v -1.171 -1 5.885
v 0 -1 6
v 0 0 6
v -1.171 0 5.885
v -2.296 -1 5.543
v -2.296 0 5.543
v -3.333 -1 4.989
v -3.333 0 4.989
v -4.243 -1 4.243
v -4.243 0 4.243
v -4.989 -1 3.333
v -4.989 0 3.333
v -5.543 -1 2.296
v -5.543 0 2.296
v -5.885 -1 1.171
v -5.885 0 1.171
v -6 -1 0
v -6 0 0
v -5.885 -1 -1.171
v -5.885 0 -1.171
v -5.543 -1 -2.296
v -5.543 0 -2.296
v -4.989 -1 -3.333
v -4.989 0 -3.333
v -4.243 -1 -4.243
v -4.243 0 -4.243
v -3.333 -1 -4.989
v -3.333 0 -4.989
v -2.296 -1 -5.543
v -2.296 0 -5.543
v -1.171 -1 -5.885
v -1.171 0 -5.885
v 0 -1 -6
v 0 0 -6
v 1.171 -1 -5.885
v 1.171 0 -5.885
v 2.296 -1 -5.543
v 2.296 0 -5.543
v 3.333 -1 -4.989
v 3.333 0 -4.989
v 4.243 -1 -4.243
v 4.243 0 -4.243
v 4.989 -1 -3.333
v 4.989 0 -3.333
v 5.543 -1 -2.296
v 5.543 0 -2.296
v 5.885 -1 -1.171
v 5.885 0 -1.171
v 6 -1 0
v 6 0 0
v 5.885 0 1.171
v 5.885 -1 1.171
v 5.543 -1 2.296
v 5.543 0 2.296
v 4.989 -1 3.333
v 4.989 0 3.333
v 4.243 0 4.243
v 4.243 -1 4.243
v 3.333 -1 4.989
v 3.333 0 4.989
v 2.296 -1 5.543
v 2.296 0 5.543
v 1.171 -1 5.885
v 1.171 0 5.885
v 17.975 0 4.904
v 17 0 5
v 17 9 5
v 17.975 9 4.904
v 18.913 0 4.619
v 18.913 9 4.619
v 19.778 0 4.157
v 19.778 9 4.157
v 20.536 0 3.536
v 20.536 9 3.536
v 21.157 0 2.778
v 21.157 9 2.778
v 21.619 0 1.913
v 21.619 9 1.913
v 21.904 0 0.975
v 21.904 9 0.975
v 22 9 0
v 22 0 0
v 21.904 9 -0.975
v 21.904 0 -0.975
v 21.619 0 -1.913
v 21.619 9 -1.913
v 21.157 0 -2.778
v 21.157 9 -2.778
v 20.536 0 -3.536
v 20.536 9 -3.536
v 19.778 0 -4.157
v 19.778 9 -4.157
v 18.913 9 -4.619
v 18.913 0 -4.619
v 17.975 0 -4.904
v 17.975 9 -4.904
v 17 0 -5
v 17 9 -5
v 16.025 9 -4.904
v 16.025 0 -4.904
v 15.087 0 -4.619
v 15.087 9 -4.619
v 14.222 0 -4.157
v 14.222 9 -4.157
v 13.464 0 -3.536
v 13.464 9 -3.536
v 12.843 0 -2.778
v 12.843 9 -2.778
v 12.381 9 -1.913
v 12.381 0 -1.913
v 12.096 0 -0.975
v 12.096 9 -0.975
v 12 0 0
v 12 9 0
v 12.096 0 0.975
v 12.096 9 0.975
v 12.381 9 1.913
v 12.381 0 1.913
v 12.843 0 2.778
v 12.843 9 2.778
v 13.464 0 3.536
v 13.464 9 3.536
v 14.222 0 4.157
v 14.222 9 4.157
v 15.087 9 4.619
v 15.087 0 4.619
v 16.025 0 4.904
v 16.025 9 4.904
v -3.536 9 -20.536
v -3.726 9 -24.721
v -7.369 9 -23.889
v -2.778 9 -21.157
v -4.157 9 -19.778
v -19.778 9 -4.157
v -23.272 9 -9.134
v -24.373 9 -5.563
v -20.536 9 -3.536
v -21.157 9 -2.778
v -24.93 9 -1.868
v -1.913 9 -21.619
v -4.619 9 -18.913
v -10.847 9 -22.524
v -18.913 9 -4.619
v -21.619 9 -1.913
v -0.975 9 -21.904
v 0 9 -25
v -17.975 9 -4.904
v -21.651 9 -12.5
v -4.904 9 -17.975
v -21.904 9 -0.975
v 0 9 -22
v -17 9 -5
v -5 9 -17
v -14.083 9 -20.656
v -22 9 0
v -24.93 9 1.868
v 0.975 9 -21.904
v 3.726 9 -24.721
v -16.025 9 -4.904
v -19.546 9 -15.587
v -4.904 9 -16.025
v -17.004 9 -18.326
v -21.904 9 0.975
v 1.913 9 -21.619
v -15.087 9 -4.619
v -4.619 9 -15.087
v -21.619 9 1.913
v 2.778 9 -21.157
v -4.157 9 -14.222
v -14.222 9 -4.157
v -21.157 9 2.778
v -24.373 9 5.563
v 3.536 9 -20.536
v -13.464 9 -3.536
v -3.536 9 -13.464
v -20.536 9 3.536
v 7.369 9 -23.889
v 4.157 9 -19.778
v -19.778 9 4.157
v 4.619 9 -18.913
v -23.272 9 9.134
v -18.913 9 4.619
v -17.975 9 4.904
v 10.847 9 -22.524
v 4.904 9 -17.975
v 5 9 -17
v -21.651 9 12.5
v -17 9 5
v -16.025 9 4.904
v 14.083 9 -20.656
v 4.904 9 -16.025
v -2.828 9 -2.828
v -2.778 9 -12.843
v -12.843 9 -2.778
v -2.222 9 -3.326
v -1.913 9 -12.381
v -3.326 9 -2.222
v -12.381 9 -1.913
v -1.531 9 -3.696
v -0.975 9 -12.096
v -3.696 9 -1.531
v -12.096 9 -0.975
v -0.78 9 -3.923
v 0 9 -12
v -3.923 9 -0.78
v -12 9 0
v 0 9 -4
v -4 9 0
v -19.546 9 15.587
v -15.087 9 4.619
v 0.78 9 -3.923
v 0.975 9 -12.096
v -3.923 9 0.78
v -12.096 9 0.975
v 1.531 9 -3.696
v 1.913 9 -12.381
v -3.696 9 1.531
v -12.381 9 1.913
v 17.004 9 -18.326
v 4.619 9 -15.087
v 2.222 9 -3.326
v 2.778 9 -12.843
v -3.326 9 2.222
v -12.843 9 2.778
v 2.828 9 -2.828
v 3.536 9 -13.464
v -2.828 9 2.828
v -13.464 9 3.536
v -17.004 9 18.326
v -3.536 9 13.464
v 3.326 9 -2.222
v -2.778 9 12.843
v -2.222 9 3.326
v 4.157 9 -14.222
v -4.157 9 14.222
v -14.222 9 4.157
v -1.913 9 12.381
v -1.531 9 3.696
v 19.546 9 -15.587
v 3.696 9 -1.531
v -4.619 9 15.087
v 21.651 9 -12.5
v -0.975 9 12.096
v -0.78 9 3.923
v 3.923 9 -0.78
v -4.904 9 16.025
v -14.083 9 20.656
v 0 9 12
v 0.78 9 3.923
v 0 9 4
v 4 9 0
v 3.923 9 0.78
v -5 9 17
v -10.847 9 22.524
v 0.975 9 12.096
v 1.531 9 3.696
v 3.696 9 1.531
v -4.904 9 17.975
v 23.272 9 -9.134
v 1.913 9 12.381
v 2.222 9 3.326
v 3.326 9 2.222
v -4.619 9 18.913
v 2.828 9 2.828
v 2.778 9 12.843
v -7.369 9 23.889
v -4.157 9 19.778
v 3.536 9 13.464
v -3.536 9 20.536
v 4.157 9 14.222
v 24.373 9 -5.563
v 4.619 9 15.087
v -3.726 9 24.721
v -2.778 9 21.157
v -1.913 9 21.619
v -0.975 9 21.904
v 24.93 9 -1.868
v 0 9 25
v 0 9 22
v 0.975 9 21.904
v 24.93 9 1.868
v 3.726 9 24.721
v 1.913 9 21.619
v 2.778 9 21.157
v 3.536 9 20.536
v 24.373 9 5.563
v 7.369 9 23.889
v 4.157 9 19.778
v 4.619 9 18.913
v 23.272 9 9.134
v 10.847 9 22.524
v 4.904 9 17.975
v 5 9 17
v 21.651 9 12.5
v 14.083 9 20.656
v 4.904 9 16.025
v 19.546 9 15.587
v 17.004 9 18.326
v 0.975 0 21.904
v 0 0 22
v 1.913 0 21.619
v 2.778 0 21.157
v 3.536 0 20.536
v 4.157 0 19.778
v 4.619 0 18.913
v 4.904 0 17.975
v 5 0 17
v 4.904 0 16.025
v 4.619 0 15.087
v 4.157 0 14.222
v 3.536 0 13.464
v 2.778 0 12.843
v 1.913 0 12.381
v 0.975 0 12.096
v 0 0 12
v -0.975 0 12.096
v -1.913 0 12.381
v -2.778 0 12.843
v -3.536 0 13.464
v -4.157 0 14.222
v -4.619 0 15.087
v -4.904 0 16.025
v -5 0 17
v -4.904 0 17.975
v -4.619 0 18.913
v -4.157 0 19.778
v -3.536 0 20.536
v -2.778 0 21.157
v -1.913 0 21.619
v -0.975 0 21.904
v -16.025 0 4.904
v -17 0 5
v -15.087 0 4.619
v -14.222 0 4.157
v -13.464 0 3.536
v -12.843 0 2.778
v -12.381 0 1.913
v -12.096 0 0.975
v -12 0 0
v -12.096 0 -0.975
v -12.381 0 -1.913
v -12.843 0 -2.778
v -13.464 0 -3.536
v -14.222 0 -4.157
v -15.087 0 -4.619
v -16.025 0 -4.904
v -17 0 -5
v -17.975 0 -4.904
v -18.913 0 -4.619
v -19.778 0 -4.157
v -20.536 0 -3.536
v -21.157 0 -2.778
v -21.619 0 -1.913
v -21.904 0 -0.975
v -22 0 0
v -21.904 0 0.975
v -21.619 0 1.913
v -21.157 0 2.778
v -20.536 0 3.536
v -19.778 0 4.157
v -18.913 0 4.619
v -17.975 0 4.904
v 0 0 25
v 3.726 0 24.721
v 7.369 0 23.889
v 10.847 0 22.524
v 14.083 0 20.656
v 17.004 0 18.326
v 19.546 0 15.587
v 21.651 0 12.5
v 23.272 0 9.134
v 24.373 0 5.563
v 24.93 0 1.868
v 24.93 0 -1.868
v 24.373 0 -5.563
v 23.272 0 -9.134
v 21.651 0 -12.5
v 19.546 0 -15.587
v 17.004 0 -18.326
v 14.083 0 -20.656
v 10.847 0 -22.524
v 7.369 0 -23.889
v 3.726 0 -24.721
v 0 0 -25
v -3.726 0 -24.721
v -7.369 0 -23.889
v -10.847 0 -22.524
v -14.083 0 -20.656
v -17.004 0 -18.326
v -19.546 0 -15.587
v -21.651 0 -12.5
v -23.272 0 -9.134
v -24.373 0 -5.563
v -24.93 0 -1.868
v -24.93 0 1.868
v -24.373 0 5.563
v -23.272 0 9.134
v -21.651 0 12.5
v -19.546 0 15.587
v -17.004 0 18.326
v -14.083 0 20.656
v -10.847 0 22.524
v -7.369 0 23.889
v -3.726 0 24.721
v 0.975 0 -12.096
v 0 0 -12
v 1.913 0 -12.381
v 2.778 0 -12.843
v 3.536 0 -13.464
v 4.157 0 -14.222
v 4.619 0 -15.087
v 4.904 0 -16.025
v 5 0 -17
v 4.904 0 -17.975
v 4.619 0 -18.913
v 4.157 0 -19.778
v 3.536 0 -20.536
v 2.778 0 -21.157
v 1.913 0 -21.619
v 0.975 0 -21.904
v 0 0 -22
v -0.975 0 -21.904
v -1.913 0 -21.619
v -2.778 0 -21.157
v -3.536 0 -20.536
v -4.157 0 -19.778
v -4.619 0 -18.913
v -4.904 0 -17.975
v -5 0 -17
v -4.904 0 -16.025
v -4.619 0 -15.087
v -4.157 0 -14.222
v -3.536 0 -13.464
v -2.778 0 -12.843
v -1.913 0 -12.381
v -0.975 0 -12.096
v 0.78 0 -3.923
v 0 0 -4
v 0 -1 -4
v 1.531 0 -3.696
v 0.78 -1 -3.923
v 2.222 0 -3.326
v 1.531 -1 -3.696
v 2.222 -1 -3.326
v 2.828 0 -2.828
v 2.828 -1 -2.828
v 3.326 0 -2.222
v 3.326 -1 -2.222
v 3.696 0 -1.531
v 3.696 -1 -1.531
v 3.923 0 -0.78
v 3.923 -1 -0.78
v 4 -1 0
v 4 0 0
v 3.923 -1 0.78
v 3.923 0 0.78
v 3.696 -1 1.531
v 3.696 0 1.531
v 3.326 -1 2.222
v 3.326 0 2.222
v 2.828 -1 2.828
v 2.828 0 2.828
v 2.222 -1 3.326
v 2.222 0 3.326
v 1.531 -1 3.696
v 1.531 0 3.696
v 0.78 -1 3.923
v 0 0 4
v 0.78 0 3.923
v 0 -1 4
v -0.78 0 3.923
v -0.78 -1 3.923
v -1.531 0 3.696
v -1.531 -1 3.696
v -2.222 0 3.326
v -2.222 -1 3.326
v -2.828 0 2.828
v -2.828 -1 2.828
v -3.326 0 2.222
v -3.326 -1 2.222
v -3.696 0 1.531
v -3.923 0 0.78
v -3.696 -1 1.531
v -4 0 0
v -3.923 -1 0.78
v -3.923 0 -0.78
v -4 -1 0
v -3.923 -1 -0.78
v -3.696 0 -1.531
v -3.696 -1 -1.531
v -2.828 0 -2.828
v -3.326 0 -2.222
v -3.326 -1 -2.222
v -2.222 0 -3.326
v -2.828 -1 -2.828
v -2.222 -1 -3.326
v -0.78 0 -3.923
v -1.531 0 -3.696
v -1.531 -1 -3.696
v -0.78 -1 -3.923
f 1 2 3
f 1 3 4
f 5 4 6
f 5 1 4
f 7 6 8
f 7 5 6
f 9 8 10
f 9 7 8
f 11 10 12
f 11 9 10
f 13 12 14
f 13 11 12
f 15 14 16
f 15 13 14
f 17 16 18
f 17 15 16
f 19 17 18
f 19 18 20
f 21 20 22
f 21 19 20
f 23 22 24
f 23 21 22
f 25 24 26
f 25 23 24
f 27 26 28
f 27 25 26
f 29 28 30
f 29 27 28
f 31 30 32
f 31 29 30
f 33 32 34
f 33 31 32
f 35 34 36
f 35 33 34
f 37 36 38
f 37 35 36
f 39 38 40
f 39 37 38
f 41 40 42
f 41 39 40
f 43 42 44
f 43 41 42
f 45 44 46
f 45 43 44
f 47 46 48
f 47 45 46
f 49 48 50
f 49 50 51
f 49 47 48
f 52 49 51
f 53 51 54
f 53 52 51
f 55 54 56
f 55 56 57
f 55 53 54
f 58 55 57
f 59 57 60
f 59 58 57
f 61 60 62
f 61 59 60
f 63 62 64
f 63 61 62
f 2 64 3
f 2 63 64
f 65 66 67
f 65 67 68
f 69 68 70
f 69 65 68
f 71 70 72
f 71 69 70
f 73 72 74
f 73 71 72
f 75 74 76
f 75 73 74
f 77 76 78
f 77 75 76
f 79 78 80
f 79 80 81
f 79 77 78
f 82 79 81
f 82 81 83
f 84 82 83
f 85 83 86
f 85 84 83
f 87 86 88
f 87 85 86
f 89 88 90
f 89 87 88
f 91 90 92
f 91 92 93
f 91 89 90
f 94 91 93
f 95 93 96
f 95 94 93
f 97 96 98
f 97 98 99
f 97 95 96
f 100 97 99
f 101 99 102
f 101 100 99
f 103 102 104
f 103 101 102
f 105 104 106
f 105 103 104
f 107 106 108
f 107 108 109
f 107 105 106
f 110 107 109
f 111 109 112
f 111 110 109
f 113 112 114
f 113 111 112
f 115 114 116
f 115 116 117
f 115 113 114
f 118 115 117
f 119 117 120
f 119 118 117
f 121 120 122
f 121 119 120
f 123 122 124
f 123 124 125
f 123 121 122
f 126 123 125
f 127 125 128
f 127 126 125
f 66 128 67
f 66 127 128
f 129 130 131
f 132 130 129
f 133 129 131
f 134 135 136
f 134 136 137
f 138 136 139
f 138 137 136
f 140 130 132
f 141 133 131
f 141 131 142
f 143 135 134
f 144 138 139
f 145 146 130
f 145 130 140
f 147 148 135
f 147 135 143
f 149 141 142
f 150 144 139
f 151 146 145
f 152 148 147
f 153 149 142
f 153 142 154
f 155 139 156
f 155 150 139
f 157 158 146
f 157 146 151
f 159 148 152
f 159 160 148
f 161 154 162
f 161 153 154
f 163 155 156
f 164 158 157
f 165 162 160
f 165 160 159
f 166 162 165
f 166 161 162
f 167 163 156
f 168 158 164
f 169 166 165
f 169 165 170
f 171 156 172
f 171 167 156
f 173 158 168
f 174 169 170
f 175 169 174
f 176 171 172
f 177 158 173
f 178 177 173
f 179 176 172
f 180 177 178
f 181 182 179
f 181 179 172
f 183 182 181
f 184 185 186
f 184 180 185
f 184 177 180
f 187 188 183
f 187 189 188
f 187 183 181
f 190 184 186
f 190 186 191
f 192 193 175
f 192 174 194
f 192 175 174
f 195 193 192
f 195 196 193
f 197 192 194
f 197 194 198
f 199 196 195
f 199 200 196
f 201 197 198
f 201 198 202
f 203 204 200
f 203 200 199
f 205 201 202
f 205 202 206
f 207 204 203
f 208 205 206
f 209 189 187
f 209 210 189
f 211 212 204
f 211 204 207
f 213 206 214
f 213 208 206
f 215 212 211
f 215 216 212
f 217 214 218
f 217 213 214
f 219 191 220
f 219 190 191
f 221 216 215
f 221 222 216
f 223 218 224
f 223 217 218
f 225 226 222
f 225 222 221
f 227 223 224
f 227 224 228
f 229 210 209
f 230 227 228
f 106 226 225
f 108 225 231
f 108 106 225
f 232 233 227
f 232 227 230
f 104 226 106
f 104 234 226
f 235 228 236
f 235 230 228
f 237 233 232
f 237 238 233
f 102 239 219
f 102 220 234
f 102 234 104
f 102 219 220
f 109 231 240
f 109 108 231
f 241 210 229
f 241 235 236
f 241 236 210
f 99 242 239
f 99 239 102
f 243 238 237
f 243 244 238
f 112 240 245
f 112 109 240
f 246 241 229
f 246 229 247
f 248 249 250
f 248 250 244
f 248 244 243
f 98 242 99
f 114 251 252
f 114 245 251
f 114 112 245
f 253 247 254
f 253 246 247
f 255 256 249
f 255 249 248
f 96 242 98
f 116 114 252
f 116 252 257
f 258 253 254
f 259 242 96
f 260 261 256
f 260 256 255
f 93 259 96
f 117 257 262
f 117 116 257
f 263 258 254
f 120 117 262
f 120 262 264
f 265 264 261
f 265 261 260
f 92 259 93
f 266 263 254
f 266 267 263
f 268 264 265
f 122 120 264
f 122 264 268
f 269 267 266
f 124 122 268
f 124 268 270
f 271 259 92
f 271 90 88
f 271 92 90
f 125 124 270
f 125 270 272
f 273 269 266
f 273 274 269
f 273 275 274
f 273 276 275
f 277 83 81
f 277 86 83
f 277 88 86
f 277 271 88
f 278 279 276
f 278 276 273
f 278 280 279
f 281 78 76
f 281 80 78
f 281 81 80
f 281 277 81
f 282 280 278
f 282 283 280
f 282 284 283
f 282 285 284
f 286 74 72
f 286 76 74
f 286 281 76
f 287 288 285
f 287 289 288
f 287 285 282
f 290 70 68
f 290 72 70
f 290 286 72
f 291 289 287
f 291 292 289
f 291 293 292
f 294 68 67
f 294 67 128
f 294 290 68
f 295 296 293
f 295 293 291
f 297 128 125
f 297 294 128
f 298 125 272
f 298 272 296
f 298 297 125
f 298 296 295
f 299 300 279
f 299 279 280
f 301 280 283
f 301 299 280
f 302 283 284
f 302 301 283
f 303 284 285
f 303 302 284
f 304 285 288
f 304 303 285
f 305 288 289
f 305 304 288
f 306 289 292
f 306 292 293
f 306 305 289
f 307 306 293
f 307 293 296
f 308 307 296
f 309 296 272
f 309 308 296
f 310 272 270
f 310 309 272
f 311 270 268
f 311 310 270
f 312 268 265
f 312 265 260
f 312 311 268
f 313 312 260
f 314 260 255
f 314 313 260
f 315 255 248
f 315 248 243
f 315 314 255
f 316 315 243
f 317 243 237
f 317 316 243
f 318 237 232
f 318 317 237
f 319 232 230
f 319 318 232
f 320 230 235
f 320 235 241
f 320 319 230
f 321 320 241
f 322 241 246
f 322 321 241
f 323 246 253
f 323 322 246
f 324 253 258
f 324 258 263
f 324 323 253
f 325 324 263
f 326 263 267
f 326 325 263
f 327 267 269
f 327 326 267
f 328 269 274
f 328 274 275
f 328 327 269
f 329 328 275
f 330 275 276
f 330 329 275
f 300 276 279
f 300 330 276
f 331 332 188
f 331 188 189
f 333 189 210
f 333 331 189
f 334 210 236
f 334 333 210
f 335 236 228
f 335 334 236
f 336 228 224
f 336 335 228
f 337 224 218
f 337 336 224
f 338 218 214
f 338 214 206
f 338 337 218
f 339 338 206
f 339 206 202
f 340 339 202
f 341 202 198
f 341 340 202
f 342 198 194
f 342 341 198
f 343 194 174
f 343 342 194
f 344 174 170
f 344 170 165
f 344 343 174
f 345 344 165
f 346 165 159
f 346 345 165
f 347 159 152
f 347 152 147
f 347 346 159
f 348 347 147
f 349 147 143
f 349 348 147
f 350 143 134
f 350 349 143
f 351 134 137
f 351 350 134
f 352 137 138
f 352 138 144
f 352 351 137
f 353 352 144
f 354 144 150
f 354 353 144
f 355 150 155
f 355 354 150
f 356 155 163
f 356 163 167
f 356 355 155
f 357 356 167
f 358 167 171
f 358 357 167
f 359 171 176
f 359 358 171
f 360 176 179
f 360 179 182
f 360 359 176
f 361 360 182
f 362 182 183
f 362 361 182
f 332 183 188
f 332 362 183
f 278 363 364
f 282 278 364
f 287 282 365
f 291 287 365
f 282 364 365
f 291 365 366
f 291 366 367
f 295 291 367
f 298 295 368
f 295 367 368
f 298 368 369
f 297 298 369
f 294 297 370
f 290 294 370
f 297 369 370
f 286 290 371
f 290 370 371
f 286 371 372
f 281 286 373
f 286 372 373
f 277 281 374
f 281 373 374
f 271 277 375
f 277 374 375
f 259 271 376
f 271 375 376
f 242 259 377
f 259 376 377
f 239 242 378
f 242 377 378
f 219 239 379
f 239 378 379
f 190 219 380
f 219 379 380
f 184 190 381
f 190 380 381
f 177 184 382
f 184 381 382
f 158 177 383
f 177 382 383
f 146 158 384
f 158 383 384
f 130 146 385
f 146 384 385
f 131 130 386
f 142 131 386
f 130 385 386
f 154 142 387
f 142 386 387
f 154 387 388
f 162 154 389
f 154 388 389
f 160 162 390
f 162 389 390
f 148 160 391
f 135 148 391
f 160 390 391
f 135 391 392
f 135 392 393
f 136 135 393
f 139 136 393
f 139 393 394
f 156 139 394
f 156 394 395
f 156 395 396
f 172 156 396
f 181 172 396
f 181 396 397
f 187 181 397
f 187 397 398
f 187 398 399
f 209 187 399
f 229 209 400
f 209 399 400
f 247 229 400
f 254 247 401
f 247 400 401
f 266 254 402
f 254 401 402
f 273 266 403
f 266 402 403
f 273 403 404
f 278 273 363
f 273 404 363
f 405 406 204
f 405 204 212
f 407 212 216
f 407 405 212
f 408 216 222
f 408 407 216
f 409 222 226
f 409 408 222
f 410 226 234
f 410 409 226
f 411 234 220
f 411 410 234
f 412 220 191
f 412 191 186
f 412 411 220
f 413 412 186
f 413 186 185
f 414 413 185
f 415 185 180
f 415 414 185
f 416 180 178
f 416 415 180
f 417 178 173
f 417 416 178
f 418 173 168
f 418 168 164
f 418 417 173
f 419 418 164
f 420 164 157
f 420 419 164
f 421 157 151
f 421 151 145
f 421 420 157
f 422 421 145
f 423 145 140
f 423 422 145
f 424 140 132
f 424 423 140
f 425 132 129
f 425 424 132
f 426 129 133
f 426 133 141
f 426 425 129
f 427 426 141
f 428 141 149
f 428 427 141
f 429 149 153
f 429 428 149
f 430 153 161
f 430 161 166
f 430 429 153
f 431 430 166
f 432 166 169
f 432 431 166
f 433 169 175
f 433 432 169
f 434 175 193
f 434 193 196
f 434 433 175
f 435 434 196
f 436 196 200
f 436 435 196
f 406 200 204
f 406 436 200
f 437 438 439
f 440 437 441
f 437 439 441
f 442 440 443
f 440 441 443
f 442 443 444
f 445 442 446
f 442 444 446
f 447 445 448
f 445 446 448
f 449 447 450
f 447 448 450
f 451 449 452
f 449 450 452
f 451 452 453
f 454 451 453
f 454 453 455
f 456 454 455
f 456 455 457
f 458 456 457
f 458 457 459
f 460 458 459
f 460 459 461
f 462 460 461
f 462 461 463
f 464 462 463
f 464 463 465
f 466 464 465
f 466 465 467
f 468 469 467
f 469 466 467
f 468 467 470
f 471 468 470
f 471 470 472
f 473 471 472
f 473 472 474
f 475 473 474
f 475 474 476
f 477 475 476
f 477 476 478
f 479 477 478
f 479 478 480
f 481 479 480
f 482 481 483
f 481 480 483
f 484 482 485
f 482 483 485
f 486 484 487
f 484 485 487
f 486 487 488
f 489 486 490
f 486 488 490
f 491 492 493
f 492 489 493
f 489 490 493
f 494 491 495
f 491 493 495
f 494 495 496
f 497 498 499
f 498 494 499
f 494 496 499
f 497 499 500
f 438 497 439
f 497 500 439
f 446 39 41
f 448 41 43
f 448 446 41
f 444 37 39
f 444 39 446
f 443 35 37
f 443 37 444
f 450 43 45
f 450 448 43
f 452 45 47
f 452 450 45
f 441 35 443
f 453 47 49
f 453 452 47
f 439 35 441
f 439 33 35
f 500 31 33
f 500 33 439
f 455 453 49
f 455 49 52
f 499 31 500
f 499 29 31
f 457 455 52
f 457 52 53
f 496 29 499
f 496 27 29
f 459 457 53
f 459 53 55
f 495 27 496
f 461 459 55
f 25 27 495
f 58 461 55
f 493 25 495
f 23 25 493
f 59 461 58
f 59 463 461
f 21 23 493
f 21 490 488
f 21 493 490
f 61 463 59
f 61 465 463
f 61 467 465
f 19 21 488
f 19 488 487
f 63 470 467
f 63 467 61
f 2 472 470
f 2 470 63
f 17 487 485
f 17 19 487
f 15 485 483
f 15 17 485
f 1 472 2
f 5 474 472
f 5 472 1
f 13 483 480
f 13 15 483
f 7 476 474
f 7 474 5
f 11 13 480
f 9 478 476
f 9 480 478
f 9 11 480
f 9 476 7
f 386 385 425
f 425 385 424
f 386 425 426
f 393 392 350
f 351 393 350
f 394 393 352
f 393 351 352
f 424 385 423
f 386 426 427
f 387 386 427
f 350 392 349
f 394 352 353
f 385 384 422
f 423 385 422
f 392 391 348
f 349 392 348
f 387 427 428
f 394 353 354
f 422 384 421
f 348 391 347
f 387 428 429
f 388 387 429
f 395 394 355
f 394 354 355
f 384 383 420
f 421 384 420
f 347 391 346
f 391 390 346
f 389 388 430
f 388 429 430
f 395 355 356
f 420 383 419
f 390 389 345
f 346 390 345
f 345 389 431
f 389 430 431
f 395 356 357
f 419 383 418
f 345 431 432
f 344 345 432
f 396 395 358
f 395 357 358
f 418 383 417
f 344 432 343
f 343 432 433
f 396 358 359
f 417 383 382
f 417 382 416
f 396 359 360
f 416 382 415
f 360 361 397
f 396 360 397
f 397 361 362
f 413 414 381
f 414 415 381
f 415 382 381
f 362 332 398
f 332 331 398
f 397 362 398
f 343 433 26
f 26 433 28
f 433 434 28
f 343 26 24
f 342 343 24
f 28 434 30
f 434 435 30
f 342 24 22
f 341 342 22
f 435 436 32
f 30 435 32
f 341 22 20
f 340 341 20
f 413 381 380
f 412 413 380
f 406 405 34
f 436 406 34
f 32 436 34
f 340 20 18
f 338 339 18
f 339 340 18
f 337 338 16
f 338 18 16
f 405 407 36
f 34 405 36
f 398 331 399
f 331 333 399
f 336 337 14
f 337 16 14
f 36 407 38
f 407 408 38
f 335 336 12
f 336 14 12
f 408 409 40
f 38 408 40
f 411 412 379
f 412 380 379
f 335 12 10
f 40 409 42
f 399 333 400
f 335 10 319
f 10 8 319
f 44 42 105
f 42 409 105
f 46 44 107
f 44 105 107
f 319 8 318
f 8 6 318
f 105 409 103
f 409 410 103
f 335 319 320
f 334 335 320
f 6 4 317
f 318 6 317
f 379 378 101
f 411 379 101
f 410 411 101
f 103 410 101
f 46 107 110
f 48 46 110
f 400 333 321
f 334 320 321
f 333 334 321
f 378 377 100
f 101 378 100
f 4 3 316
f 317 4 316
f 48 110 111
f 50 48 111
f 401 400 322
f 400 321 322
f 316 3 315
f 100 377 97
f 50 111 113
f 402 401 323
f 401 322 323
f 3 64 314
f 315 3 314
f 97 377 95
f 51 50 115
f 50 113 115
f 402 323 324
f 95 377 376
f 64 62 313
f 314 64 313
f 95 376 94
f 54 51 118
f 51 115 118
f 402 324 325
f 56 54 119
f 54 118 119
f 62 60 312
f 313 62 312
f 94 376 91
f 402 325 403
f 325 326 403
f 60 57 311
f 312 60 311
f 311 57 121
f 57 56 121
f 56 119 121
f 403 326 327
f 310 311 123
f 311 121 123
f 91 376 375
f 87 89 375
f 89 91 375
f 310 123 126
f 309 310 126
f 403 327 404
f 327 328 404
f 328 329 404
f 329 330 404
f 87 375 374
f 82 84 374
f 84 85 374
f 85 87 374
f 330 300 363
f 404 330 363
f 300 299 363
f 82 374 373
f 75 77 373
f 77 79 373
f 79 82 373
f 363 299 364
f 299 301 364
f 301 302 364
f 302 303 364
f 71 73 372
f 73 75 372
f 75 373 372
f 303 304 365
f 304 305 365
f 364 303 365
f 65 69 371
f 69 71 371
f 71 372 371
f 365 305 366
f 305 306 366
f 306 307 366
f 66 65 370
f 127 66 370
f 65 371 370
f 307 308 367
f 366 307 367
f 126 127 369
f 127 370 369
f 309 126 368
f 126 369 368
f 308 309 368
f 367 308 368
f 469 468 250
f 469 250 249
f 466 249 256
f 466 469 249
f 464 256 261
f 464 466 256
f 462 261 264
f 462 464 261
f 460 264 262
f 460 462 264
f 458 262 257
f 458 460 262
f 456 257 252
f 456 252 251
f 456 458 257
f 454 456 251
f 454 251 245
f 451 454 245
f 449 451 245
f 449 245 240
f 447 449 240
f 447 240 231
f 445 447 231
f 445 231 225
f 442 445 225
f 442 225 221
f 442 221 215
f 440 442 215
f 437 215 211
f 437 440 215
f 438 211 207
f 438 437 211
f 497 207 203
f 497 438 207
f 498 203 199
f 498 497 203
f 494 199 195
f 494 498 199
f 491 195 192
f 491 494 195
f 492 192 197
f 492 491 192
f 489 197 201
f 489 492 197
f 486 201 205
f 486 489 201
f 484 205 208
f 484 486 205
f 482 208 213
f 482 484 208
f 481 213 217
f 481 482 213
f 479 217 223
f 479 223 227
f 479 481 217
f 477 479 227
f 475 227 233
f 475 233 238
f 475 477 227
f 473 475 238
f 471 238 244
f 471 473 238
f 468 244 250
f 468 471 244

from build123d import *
from build123d.topology import SkipClean

# Parameters (mm, degrees)
SKETCH1_R           = 25
SKETCH1_R_2         = 4
SKETCH1_R_3         = 5
BOSS_EXTRUDE1_DEPTH = 9
BOSS_EXTRUDE2_START = 1
SKETCH2_R           = 6
SKETCH2_R_2         = 4
BOSS_EXTRUDE2_DEPTH = 1


with BuildPart() as part:
    # Sketch1 → Boss-Extrude1 (new body)
    with BuildSketch(Plane(origin=(0, 0, 0), x_dir=(1, 0, 0), z_dir=(0, 1, 0))):
        with Locations(Location((0, 0, 0), (0, 0, 270))):
            Circle(SKETCH1_R)
        with Locations(Location((0, 0, 0), (0, 0, 270))):
            Circle(SKETCH1_R_2, mode=Mode.SUBTRACT)
        with Locations(Location((0, 17, 0), (0, 0, 270))):
            Circle(SKETCH1_R_3, mode=Mode.SUBTRACT)
        with Locations(Location((17, 0, 0), (0, 0, 270))):
            Circle(SKETCH1_R_3, mode=Mode.SUBTRACT)
        with Locations(Location((0, -17, 0), (0, 0, 270))):
            Circle(SKETCH1_R_3, mode=Mode.SUBTRACT)
        with Locations(Location((-17, 0, 0), (0, 0, 270))):
            Circle(SKETCH1_R_3, mode=Mode.SUBTRACT)
    extrude(amount=BOSS_EXTRUDE1_DEPTH)

    # Sketch2 → Boss-Extrude2 (add)
    with SkipClean():  # the faces are left unmerged after this step: merging them gives an invalid solid
        with BuildSketch(Plane(origin=(0, 0, 0), x_dir=(-1, 0, 0), z_dir=(0, -1, 0)).offset(BOSS_EXTRUDE2_START)):
            with Locations(Location((0, 0, 0), (0, 0, 270))):
                Circle(SKETCH2_R)
            with Locations(Location((0, 0, 0), (0, 0, 90))):
                Circle(SKETCH2_R_2, mode=Mode.SUBTRACT)
        extrude(amount=-BOSS_EXTRUDE2_DEPTH)


solid = part.part
